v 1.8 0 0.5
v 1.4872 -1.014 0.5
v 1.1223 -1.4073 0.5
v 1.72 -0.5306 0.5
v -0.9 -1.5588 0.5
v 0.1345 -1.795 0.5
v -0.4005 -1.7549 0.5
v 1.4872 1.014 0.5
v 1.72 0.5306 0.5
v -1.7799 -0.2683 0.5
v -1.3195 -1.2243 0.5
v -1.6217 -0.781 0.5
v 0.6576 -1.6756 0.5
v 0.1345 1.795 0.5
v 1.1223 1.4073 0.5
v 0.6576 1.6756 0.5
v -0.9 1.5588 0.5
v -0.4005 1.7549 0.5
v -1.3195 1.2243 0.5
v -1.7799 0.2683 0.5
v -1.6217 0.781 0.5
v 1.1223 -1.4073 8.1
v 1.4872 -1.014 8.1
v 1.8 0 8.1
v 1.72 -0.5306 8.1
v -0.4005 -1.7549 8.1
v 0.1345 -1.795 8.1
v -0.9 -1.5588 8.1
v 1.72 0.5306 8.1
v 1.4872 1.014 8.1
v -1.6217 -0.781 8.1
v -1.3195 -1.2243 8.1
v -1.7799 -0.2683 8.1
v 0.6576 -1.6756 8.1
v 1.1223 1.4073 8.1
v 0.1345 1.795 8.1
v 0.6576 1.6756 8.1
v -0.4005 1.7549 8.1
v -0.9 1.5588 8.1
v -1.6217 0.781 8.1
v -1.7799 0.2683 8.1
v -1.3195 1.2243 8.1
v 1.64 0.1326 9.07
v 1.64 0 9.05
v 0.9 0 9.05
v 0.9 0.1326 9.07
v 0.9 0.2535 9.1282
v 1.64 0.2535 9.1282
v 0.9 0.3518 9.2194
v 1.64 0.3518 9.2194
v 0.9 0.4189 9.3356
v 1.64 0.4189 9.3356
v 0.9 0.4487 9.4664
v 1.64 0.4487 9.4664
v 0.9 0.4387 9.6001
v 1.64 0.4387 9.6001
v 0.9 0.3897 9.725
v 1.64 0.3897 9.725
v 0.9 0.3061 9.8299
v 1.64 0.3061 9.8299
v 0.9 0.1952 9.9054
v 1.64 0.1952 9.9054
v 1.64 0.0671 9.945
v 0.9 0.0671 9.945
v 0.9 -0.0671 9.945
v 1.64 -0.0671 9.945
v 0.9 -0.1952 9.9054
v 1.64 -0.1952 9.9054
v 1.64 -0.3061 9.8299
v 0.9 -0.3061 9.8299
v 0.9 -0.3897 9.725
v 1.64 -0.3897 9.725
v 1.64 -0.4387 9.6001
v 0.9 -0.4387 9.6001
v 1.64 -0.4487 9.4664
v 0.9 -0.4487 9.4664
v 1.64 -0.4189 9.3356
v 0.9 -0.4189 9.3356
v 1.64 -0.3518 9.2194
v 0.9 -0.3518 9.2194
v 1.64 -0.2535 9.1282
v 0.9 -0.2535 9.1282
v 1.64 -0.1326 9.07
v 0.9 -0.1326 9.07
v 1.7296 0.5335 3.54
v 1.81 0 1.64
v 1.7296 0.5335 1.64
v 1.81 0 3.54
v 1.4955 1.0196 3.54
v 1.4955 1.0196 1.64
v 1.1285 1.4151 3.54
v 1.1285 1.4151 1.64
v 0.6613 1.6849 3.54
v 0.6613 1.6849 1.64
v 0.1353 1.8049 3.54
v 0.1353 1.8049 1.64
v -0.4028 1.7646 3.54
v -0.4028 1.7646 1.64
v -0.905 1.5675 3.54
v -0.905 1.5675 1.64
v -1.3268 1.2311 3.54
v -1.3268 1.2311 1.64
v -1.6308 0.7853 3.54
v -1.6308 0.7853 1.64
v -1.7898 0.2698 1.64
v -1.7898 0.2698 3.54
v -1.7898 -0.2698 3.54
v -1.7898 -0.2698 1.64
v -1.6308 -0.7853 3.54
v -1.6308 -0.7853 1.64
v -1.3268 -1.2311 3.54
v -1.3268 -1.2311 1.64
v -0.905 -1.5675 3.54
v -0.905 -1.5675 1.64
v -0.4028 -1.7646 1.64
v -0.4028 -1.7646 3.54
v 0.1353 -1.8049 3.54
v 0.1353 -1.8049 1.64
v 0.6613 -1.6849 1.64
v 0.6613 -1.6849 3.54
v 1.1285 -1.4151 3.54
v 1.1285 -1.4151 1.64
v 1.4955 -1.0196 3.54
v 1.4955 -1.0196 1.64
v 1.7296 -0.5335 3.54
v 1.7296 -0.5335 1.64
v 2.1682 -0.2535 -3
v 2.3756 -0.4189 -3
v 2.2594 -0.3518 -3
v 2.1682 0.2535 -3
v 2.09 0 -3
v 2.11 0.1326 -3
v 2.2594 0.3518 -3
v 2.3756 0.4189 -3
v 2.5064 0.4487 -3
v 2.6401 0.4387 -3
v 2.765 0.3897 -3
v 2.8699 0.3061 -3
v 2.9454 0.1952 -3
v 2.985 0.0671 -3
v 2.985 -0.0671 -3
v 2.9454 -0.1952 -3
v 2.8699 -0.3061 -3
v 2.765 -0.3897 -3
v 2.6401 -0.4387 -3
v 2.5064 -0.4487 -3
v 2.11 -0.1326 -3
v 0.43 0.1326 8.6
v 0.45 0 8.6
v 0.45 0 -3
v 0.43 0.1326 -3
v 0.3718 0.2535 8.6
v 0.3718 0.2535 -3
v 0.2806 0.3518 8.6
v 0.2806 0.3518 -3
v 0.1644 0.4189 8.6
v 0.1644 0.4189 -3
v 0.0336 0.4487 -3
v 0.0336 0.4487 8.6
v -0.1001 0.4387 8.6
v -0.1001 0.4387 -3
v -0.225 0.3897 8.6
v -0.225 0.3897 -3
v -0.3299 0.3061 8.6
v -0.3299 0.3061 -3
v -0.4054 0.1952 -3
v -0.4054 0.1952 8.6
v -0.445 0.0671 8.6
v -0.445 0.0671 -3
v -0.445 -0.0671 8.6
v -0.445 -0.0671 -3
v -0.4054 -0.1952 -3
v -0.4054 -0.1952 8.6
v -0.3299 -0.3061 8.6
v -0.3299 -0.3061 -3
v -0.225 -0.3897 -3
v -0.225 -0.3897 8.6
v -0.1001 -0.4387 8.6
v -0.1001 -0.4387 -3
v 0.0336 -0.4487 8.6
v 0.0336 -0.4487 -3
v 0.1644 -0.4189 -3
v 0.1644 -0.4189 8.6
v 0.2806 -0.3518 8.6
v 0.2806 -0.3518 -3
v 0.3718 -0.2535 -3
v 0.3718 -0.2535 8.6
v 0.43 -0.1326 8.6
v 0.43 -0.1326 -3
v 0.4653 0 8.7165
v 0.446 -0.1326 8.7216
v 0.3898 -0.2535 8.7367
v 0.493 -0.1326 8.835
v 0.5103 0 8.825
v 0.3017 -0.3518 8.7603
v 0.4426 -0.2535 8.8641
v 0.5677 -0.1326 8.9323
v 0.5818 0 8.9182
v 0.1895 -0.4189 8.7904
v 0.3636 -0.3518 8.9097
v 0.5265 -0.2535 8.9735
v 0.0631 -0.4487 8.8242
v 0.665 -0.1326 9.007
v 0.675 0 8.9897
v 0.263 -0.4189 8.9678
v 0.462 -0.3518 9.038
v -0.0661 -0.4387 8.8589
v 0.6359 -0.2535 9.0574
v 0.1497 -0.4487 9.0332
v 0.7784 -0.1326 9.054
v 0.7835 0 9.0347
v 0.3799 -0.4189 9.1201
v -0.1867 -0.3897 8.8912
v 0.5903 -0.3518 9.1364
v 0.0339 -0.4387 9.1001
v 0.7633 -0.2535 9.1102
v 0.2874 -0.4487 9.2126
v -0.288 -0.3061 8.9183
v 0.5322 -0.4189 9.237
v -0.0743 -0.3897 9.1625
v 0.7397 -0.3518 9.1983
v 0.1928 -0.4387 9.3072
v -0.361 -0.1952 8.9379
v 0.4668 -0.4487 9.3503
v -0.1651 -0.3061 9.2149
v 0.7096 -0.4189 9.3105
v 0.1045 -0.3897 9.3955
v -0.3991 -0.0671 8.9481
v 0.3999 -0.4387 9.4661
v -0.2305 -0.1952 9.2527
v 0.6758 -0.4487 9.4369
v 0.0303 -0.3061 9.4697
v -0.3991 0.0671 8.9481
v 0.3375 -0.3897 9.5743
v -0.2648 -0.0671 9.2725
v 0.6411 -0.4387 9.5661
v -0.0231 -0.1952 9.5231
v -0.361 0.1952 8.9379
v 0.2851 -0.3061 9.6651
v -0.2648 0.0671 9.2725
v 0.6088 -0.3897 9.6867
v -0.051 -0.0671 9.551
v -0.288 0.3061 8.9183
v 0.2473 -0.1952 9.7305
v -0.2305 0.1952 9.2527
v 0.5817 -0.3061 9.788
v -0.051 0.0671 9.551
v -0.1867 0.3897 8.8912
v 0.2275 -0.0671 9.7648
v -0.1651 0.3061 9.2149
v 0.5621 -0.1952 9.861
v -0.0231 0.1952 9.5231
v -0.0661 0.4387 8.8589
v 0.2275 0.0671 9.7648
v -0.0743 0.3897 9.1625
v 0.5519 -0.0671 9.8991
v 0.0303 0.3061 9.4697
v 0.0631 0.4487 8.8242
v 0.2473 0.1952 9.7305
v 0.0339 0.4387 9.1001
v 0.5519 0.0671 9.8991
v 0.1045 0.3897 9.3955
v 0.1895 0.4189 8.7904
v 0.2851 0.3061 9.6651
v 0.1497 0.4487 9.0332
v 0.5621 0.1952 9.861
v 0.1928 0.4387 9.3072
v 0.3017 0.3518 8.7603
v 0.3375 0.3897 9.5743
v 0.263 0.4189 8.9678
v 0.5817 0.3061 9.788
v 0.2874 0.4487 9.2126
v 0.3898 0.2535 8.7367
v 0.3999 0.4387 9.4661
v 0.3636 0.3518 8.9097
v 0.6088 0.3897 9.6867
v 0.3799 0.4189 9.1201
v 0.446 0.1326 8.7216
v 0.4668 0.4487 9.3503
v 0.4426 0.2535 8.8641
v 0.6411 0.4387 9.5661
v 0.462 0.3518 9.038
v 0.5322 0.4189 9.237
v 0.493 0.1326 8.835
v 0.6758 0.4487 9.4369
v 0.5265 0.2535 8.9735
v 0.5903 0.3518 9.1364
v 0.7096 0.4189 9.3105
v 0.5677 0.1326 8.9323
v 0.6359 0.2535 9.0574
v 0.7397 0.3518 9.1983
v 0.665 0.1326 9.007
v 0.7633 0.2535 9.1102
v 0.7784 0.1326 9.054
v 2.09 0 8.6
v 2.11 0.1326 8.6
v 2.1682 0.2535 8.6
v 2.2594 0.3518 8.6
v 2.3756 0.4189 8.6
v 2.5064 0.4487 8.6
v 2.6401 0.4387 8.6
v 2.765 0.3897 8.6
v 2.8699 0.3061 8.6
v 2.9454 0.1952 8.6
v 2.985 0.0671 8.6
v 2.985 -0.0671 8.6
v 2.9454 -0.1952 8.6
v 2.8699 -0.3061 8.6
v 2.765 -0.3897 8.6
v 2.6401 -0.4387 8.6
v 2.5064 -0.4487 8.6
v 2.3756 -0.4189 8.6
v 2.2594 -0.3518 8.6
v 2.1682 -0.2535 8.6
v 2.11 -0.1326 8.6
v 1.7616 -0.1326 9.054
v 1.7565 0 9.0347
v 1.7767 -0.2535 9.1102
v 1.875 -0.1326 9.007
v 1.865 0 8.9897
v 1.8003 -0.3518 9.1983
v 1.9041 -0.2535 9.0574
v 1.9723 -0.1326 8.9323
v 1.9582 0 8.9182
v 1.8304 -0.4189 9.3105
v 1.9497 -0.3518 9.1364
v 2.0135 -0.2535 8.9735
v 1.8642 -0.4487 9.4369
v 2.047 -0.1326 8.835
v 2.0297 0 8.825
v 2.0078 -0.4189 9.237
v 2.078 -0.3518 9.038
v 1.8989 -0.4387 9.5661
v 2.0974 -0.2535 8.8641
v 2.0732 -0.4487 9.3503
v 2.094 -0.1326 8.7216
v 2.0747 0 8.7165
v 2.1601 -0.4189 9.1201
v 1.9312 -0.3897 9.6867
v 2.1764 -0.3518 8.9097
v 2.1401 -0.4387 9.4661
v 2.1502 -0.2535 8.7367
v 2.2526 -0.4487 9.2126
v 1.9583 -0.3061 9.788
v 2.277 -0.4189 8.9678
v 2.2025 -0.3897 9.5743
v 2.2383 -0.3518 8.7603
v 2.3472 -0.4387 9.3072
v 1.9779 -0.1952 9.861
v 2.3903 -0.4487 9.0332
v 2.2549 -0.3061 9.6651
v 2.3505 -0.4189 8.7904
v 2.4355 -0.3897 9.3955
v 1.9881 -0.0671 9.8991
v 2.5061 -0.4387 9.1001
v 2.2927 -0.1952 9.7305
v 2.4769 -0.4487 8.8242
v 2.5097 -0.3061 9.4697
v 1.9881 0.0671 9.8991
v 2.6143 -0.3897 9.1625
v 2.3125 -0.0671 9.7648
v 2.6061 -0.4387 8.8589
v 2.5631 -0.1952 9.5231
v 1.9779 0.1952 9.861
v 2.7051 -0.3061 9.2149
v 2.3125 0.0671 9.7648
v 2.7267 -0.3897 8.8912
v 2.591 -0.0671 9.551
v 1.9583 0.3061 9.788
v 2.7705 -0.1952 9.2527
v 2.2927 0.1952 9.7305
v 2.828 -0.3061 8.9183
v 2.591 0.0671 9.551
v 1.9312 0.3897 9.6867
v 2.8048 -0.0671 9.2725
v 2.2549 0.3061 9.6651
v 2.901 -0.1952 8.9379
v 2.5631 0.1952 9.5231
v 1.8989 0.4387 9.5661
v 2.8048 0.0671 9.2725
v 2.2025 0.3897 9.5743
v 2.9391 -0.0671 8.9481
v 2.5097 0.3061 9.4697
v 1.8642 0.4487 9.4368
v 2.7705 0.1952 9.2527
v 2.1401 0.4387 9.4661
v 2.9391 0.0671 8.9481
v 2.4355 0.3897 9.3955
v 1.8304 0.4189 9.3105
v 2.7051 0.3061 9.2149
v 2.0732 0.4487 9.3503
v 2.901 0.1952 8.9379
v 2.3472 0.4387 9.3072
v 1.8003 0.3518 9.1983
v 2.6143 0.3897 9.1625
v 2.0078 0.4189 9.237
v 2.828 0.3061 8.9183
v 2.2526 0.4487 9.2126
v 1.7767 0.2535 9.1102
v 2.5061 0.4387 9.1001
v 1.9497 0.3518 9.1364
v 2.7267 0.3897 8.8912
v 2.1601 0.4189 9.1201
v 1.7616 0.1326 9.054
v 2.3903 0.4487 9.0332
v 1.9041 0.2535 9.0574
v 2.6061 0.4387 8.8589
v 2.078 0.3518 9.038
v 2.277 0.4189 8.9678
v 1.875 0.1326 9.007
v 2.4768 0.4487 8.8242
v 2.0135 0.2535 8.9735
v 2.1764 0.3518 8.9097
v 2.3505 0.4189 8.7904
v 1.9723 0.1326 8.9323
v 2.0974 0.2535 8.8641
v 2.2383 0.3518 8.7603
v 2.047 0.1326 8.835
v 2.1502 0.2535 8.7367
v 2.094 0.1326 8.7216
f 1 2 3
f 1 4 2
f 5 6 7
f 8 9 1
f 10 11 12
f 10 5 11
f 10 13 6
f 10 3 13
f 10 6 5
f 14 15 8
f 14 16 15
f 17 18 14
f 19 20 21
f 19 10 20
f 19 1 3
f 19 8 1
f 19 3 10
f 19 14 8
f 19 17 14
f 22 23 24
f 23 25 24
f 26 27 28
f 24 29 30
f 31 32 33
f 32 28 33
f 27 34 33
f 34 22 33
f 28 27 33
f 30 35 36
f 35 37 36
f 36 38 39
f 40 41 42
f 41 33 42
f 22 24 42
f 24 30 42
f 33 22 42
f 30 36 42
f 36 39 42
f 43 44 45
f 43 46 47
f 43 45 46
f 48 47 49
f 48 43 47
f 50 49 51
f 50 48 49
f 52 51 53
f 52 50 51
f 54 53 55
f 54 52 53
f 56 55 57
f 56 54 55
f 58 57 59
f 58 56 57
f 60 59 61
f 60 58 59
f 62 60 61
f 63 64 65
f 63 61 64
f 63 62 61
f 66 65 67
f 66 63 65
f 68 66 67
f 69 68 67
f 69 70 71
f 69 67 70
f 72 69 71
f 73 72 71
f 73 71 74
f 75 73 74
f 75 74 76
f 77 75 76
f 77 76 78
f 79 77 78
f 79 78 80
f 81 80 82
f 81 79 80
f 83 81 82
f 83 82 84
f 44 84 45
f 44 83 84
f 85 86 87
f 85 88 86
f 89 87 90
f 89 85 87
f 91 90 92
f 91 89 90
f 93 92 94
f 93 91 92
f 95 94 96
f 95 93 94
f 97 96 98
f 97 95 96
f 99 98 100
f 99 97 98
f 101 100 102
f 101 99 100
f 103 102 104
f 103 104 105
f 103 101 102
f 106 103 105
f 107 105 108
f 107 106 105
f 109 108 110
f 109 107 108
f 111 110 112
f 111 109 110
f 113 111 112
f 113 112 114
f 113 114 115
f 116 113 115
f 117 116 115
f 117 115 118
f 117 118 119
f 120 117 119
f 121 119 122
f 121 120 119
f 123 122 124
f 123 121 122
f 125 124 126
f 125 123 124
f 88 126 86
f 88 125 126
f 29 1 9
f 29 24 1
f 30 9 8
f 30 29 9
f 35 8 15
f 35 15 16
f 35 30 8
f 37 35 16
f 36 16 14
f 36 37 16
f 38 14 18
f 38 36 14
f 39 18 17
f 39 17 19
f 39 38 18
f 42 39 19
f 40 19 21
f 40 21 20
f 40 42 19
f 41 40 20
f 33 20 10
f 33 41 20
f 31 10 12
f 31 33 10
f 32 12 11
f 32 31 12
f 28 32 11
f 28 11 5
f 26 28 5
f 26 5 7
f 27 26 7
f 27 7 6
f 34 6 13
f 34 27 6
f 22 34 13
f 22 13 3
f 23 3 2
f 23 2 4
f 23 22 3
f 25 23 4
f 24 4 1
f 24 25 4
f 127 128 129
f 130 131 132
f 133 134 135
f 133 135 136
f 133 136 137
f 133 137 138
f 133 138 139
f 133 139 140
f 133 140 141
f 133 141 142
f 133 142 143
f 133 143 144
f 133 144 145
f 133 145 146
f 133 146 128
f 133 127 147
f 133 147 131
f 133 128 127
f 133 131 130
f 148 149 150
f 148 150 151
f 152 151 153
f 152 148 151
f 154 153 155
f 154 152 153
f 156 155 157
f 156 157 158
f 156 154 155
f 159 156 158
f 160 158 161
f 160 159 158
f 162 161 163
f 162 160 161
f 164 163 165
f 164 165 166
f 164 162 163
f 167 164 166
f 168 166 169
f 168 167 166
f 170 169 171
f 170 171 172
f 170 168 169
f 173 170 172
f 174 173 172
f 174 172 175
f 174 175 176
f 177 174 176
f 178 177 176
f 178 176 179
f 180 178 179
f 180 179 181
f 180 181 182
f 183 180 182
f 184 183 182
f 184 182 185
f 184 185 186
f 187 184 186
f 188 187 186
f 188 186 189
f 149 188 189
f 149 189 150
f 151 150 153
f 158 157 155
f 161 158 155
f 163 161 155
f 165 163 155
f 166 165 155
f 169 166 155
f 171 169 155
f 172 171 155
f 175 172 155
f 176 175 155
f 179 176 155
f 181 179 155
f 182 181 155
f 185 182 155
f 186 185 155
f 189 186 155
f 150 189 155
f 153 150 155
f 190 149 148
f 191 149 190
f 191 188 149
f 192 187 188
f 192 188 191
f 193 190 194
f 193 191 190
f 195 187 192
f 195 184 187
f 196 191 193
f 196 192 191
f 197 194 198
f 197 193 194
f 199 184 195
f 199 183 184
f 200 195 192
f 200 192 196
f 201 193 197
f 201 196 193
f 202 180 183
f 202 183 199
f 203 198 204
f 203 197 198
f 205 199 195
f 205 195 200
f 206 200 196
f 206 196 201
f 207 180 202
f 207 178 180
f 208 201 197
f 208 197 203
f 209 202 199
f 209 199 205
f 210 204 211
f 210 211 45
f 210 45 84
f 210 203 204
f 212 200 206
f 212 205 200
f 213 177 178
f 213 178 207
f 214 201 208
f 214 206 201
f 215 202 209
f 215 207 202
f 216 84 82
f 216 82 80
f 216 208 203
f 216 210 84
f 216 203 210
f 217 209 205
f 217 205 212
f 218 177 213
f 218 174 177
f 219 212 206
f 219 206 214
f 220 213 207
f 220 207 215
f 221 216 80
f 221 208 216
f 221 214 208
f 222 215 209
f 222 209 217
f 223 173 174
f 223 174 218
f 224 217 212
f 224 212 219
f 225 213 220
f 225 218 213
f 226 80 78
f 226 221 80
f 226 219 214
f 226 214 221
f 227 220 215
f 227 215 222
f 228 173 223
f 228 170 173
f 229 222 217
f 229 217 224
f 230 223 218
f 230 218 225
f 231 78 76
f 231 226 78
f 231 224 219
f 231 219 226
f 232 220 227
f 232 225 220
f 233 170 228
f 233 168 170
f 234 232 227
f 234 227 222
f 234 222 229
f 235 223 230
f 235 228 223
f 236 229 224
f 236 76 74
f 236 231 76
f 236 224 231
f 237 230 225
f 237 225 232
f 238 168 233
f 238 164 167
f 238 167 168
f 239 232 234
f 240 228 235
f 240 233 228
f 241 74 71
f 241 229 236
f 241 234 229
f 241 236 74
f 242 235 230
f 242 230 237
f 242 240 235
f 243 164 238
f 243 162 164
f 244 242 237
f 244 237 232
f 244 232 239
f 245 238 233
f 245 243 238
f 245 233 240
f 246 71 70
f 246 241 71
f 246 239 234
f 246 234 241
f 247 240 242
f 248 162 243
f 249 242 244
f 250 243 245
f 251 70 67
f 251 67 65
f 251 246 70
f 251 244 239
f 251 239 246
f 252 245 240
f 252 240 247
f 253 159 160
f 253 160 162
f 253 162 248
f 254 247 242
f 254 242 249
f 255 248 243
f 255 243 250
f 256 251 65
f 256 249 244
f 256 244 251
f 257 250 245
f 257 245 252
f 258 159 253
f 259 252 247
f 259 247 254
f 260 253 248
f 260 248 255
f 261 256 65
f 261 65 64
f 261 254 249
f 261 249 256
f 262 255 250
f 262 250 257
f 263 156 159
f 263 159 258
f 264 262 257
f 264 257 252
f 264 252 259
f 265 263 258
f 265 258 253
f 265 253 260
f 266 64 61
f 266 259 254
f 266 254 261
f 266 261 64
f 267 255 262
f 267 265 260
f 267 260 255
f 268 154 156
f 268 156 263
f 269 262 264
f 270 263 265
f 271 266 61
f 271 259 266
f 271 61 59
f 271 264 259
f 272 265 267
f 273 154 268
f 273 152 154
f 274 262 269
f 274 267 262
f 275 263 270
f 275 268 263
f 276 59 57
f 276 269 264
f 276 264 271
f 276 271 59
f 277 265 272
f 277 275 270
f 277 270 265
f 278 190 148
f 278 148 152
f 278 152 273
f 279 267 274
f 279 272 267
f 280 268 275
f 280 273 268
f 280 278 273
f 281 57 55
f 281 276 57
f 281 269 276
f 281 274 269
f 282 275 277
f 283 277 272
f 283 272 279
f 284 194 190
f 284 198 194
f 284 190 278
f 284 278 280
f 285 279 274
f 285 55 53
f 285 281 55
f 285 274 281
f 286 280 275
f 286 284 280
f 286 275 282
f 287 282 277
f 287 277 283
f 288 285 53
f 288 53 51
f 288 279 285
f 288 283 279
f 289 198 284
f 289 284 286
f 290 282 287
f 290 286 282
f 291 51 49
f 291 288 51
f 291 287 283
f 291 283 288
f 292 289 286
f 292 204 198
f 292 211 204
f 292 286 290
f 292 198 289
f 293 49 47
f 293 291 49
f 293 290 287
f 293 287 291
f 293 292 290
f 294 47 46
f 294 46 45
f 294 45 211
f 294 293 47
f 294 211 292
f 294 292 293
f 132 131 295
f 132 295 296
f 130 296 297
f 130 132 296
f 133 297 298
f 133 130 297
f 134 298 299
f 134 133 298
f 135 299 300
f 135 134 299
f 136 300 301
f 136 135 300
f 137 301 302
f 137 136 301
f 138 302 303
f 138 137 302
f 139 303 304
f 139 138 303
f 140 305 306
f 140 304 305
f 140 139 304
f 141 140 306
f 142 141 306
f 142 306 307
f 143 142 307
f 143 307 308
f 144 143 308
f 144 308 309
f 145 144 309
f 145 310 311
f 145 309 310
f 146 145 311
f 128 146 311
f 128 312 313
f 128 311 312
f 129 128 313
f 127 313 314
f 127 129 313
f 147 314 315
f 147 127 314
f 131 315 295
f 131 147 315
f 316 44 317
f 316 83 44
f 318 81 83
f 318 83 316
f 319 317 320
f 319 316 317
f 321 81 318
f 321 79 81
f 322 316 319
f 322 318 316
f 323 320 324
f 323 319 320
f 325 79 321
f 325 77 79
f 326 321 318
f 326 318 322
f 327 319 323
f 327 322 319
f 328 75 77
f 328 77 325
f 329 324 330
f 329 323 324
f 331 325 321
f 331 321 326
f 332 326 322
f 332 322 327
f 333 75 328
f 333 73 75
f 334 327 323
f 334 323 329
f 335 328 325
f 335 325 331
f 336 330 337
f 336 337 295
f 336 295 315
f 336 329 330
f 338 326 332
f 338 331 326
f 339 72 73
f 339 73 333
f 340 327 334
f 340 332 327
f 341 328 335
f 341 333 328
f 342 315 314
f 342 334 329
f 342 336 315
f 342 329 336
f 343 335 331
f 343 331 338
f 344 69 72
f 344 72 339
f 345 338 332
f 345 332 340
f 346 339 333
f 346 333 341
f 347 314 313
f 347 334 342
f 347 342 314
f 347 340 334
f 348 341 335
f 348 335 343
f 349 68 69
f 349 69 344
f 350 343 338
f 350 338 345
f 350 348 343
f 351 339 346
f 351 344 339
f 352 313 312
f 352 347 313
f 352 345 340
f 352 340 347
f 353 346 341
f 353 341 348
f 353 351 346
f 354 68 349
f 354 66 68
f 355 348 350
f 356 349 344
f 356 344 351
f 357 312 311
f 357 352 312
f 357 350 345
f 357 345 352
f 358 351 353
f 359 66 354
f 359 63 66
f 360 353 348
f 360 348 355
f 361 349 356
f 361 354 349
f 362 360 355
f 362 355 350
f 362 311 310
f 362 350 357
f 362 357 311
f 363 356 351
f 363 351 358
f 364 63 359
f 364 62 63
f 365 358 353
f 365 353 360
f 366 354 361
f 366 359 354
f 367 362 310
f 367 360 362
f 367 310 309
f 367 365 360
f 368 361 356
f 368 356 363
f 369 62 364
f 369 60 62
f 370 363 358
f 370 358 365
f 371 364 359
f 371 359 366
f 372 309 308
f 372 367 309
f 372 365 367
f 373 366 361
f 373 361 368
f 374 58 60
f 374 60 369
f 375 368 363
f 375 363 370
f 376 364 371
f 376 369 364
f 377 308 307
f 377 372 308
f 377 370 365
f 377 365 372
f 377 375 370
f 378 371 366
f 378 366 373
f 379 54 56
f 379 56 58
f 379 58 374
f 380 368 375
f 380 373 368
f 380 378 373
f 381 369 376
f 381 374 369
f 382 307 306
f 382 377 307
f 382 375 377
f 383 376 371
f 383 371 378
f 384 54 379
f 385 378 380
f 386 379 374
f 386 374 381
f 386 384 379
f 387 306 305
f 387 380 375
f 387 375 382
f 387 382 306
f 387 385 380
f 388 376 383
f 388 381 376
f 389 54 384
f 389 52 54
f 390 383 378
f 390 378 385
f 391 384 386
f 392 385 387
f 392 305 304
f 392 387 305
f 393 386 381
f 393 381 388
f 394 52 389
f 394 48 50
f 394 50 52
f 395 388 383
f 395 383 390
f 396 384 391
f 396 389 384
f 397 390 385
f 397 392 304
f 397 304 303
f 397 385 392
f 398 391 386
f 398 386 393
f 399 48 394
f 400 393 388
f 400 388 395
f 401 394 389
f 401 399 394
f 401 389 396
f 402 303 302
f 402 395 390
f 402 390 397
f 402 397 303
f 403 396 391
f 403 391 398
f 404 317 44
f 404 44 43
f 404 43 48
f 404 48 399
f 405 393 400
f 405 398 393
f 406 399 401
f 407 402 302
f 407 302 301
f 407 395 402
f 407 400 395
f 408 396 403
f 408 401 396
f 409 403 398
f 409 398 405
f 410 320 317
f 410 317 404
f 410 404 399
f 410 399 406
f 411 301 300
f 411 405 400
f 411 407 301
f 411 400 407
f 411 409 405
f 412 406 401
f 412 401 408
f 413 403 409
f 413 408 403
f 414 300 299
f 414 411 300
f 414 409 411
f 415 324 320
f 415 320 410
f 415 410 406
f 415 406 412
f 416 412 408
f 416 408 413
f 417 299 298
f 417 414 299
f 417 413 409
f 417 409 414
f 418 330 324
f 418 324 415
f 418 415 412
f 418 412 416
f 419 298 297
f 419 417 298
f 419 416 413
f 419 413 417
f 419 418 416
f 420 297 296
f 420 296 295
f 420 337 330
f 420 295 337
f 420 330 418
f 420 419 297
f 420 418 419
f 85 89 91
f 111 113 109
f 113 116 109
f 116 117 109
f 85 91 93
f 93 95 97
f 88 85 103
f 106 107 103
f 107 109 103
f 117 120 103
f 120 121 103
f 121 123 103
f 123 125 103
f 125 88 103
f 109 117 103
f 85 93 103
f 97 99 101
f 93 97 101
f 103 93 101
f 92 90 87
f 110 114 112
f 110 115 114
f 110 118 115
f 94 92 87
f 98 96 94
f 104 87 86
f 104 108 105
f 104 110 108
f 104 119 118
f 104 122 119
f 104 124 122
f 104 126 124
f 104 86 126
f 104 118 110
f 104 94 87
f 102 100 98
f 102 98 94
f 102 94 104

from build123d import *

# Parameters (mm, degrees)
SKETCH001_R = 0.45
SKETCH002_W = 1.8
SKETCH002_H = 7.6
SKETCH003_W = 1.81
SKETCH003_H = 1.9


with BuildPart() as sweep_body:
    # Sweep: sweep along a path in Sketch
    with BuildLine(Plane.XZ) as sweep_path:
        Line((0, -3), (0, 8.6))
        ThreePointArc((0, 8.6), (0.263604, 9.236396), (0.9, 9.5))
        Line((0.9, 9.5), (1.64, 9.5))
        ThreePointArc((1.64, 9.5), (2.276396, 9.236396), (2.54, 8.6))
        Line((2.54, 8.6), (2.54, -3))
    # Sketch001 → Sweep (sweep)
    with BuildSketch(Plane.XY):
        Circle(SKETCH001_R)
    sweep(path=sweep_path.line)


with BuildPart() as revolution:
    # Sketch002 → Revolution (revolve)
    with BuildSketch(Plane.XZ):
        with Locations((0.9, 4.3)):
            Rectangle(SKETCH002_W, SKETCH002_H)
    revolve(axis=Axis((0, 0, 0.5), (0, 0, 1)))


with BuildPart() as revolution001:
    # Sketch003 → Revolution001 (revolve)
    with BuildSketch(Plane.XZ):
        with Locations((0.905, 2.59)):
            Rectangle(SKETCH003_W, SKETCH003_H)
    revolve(axis=Axis((0, 0, 0), (0, 0, 1)))


solid = Compound([sweep_body.part, revolution.part, revolution001.part])
